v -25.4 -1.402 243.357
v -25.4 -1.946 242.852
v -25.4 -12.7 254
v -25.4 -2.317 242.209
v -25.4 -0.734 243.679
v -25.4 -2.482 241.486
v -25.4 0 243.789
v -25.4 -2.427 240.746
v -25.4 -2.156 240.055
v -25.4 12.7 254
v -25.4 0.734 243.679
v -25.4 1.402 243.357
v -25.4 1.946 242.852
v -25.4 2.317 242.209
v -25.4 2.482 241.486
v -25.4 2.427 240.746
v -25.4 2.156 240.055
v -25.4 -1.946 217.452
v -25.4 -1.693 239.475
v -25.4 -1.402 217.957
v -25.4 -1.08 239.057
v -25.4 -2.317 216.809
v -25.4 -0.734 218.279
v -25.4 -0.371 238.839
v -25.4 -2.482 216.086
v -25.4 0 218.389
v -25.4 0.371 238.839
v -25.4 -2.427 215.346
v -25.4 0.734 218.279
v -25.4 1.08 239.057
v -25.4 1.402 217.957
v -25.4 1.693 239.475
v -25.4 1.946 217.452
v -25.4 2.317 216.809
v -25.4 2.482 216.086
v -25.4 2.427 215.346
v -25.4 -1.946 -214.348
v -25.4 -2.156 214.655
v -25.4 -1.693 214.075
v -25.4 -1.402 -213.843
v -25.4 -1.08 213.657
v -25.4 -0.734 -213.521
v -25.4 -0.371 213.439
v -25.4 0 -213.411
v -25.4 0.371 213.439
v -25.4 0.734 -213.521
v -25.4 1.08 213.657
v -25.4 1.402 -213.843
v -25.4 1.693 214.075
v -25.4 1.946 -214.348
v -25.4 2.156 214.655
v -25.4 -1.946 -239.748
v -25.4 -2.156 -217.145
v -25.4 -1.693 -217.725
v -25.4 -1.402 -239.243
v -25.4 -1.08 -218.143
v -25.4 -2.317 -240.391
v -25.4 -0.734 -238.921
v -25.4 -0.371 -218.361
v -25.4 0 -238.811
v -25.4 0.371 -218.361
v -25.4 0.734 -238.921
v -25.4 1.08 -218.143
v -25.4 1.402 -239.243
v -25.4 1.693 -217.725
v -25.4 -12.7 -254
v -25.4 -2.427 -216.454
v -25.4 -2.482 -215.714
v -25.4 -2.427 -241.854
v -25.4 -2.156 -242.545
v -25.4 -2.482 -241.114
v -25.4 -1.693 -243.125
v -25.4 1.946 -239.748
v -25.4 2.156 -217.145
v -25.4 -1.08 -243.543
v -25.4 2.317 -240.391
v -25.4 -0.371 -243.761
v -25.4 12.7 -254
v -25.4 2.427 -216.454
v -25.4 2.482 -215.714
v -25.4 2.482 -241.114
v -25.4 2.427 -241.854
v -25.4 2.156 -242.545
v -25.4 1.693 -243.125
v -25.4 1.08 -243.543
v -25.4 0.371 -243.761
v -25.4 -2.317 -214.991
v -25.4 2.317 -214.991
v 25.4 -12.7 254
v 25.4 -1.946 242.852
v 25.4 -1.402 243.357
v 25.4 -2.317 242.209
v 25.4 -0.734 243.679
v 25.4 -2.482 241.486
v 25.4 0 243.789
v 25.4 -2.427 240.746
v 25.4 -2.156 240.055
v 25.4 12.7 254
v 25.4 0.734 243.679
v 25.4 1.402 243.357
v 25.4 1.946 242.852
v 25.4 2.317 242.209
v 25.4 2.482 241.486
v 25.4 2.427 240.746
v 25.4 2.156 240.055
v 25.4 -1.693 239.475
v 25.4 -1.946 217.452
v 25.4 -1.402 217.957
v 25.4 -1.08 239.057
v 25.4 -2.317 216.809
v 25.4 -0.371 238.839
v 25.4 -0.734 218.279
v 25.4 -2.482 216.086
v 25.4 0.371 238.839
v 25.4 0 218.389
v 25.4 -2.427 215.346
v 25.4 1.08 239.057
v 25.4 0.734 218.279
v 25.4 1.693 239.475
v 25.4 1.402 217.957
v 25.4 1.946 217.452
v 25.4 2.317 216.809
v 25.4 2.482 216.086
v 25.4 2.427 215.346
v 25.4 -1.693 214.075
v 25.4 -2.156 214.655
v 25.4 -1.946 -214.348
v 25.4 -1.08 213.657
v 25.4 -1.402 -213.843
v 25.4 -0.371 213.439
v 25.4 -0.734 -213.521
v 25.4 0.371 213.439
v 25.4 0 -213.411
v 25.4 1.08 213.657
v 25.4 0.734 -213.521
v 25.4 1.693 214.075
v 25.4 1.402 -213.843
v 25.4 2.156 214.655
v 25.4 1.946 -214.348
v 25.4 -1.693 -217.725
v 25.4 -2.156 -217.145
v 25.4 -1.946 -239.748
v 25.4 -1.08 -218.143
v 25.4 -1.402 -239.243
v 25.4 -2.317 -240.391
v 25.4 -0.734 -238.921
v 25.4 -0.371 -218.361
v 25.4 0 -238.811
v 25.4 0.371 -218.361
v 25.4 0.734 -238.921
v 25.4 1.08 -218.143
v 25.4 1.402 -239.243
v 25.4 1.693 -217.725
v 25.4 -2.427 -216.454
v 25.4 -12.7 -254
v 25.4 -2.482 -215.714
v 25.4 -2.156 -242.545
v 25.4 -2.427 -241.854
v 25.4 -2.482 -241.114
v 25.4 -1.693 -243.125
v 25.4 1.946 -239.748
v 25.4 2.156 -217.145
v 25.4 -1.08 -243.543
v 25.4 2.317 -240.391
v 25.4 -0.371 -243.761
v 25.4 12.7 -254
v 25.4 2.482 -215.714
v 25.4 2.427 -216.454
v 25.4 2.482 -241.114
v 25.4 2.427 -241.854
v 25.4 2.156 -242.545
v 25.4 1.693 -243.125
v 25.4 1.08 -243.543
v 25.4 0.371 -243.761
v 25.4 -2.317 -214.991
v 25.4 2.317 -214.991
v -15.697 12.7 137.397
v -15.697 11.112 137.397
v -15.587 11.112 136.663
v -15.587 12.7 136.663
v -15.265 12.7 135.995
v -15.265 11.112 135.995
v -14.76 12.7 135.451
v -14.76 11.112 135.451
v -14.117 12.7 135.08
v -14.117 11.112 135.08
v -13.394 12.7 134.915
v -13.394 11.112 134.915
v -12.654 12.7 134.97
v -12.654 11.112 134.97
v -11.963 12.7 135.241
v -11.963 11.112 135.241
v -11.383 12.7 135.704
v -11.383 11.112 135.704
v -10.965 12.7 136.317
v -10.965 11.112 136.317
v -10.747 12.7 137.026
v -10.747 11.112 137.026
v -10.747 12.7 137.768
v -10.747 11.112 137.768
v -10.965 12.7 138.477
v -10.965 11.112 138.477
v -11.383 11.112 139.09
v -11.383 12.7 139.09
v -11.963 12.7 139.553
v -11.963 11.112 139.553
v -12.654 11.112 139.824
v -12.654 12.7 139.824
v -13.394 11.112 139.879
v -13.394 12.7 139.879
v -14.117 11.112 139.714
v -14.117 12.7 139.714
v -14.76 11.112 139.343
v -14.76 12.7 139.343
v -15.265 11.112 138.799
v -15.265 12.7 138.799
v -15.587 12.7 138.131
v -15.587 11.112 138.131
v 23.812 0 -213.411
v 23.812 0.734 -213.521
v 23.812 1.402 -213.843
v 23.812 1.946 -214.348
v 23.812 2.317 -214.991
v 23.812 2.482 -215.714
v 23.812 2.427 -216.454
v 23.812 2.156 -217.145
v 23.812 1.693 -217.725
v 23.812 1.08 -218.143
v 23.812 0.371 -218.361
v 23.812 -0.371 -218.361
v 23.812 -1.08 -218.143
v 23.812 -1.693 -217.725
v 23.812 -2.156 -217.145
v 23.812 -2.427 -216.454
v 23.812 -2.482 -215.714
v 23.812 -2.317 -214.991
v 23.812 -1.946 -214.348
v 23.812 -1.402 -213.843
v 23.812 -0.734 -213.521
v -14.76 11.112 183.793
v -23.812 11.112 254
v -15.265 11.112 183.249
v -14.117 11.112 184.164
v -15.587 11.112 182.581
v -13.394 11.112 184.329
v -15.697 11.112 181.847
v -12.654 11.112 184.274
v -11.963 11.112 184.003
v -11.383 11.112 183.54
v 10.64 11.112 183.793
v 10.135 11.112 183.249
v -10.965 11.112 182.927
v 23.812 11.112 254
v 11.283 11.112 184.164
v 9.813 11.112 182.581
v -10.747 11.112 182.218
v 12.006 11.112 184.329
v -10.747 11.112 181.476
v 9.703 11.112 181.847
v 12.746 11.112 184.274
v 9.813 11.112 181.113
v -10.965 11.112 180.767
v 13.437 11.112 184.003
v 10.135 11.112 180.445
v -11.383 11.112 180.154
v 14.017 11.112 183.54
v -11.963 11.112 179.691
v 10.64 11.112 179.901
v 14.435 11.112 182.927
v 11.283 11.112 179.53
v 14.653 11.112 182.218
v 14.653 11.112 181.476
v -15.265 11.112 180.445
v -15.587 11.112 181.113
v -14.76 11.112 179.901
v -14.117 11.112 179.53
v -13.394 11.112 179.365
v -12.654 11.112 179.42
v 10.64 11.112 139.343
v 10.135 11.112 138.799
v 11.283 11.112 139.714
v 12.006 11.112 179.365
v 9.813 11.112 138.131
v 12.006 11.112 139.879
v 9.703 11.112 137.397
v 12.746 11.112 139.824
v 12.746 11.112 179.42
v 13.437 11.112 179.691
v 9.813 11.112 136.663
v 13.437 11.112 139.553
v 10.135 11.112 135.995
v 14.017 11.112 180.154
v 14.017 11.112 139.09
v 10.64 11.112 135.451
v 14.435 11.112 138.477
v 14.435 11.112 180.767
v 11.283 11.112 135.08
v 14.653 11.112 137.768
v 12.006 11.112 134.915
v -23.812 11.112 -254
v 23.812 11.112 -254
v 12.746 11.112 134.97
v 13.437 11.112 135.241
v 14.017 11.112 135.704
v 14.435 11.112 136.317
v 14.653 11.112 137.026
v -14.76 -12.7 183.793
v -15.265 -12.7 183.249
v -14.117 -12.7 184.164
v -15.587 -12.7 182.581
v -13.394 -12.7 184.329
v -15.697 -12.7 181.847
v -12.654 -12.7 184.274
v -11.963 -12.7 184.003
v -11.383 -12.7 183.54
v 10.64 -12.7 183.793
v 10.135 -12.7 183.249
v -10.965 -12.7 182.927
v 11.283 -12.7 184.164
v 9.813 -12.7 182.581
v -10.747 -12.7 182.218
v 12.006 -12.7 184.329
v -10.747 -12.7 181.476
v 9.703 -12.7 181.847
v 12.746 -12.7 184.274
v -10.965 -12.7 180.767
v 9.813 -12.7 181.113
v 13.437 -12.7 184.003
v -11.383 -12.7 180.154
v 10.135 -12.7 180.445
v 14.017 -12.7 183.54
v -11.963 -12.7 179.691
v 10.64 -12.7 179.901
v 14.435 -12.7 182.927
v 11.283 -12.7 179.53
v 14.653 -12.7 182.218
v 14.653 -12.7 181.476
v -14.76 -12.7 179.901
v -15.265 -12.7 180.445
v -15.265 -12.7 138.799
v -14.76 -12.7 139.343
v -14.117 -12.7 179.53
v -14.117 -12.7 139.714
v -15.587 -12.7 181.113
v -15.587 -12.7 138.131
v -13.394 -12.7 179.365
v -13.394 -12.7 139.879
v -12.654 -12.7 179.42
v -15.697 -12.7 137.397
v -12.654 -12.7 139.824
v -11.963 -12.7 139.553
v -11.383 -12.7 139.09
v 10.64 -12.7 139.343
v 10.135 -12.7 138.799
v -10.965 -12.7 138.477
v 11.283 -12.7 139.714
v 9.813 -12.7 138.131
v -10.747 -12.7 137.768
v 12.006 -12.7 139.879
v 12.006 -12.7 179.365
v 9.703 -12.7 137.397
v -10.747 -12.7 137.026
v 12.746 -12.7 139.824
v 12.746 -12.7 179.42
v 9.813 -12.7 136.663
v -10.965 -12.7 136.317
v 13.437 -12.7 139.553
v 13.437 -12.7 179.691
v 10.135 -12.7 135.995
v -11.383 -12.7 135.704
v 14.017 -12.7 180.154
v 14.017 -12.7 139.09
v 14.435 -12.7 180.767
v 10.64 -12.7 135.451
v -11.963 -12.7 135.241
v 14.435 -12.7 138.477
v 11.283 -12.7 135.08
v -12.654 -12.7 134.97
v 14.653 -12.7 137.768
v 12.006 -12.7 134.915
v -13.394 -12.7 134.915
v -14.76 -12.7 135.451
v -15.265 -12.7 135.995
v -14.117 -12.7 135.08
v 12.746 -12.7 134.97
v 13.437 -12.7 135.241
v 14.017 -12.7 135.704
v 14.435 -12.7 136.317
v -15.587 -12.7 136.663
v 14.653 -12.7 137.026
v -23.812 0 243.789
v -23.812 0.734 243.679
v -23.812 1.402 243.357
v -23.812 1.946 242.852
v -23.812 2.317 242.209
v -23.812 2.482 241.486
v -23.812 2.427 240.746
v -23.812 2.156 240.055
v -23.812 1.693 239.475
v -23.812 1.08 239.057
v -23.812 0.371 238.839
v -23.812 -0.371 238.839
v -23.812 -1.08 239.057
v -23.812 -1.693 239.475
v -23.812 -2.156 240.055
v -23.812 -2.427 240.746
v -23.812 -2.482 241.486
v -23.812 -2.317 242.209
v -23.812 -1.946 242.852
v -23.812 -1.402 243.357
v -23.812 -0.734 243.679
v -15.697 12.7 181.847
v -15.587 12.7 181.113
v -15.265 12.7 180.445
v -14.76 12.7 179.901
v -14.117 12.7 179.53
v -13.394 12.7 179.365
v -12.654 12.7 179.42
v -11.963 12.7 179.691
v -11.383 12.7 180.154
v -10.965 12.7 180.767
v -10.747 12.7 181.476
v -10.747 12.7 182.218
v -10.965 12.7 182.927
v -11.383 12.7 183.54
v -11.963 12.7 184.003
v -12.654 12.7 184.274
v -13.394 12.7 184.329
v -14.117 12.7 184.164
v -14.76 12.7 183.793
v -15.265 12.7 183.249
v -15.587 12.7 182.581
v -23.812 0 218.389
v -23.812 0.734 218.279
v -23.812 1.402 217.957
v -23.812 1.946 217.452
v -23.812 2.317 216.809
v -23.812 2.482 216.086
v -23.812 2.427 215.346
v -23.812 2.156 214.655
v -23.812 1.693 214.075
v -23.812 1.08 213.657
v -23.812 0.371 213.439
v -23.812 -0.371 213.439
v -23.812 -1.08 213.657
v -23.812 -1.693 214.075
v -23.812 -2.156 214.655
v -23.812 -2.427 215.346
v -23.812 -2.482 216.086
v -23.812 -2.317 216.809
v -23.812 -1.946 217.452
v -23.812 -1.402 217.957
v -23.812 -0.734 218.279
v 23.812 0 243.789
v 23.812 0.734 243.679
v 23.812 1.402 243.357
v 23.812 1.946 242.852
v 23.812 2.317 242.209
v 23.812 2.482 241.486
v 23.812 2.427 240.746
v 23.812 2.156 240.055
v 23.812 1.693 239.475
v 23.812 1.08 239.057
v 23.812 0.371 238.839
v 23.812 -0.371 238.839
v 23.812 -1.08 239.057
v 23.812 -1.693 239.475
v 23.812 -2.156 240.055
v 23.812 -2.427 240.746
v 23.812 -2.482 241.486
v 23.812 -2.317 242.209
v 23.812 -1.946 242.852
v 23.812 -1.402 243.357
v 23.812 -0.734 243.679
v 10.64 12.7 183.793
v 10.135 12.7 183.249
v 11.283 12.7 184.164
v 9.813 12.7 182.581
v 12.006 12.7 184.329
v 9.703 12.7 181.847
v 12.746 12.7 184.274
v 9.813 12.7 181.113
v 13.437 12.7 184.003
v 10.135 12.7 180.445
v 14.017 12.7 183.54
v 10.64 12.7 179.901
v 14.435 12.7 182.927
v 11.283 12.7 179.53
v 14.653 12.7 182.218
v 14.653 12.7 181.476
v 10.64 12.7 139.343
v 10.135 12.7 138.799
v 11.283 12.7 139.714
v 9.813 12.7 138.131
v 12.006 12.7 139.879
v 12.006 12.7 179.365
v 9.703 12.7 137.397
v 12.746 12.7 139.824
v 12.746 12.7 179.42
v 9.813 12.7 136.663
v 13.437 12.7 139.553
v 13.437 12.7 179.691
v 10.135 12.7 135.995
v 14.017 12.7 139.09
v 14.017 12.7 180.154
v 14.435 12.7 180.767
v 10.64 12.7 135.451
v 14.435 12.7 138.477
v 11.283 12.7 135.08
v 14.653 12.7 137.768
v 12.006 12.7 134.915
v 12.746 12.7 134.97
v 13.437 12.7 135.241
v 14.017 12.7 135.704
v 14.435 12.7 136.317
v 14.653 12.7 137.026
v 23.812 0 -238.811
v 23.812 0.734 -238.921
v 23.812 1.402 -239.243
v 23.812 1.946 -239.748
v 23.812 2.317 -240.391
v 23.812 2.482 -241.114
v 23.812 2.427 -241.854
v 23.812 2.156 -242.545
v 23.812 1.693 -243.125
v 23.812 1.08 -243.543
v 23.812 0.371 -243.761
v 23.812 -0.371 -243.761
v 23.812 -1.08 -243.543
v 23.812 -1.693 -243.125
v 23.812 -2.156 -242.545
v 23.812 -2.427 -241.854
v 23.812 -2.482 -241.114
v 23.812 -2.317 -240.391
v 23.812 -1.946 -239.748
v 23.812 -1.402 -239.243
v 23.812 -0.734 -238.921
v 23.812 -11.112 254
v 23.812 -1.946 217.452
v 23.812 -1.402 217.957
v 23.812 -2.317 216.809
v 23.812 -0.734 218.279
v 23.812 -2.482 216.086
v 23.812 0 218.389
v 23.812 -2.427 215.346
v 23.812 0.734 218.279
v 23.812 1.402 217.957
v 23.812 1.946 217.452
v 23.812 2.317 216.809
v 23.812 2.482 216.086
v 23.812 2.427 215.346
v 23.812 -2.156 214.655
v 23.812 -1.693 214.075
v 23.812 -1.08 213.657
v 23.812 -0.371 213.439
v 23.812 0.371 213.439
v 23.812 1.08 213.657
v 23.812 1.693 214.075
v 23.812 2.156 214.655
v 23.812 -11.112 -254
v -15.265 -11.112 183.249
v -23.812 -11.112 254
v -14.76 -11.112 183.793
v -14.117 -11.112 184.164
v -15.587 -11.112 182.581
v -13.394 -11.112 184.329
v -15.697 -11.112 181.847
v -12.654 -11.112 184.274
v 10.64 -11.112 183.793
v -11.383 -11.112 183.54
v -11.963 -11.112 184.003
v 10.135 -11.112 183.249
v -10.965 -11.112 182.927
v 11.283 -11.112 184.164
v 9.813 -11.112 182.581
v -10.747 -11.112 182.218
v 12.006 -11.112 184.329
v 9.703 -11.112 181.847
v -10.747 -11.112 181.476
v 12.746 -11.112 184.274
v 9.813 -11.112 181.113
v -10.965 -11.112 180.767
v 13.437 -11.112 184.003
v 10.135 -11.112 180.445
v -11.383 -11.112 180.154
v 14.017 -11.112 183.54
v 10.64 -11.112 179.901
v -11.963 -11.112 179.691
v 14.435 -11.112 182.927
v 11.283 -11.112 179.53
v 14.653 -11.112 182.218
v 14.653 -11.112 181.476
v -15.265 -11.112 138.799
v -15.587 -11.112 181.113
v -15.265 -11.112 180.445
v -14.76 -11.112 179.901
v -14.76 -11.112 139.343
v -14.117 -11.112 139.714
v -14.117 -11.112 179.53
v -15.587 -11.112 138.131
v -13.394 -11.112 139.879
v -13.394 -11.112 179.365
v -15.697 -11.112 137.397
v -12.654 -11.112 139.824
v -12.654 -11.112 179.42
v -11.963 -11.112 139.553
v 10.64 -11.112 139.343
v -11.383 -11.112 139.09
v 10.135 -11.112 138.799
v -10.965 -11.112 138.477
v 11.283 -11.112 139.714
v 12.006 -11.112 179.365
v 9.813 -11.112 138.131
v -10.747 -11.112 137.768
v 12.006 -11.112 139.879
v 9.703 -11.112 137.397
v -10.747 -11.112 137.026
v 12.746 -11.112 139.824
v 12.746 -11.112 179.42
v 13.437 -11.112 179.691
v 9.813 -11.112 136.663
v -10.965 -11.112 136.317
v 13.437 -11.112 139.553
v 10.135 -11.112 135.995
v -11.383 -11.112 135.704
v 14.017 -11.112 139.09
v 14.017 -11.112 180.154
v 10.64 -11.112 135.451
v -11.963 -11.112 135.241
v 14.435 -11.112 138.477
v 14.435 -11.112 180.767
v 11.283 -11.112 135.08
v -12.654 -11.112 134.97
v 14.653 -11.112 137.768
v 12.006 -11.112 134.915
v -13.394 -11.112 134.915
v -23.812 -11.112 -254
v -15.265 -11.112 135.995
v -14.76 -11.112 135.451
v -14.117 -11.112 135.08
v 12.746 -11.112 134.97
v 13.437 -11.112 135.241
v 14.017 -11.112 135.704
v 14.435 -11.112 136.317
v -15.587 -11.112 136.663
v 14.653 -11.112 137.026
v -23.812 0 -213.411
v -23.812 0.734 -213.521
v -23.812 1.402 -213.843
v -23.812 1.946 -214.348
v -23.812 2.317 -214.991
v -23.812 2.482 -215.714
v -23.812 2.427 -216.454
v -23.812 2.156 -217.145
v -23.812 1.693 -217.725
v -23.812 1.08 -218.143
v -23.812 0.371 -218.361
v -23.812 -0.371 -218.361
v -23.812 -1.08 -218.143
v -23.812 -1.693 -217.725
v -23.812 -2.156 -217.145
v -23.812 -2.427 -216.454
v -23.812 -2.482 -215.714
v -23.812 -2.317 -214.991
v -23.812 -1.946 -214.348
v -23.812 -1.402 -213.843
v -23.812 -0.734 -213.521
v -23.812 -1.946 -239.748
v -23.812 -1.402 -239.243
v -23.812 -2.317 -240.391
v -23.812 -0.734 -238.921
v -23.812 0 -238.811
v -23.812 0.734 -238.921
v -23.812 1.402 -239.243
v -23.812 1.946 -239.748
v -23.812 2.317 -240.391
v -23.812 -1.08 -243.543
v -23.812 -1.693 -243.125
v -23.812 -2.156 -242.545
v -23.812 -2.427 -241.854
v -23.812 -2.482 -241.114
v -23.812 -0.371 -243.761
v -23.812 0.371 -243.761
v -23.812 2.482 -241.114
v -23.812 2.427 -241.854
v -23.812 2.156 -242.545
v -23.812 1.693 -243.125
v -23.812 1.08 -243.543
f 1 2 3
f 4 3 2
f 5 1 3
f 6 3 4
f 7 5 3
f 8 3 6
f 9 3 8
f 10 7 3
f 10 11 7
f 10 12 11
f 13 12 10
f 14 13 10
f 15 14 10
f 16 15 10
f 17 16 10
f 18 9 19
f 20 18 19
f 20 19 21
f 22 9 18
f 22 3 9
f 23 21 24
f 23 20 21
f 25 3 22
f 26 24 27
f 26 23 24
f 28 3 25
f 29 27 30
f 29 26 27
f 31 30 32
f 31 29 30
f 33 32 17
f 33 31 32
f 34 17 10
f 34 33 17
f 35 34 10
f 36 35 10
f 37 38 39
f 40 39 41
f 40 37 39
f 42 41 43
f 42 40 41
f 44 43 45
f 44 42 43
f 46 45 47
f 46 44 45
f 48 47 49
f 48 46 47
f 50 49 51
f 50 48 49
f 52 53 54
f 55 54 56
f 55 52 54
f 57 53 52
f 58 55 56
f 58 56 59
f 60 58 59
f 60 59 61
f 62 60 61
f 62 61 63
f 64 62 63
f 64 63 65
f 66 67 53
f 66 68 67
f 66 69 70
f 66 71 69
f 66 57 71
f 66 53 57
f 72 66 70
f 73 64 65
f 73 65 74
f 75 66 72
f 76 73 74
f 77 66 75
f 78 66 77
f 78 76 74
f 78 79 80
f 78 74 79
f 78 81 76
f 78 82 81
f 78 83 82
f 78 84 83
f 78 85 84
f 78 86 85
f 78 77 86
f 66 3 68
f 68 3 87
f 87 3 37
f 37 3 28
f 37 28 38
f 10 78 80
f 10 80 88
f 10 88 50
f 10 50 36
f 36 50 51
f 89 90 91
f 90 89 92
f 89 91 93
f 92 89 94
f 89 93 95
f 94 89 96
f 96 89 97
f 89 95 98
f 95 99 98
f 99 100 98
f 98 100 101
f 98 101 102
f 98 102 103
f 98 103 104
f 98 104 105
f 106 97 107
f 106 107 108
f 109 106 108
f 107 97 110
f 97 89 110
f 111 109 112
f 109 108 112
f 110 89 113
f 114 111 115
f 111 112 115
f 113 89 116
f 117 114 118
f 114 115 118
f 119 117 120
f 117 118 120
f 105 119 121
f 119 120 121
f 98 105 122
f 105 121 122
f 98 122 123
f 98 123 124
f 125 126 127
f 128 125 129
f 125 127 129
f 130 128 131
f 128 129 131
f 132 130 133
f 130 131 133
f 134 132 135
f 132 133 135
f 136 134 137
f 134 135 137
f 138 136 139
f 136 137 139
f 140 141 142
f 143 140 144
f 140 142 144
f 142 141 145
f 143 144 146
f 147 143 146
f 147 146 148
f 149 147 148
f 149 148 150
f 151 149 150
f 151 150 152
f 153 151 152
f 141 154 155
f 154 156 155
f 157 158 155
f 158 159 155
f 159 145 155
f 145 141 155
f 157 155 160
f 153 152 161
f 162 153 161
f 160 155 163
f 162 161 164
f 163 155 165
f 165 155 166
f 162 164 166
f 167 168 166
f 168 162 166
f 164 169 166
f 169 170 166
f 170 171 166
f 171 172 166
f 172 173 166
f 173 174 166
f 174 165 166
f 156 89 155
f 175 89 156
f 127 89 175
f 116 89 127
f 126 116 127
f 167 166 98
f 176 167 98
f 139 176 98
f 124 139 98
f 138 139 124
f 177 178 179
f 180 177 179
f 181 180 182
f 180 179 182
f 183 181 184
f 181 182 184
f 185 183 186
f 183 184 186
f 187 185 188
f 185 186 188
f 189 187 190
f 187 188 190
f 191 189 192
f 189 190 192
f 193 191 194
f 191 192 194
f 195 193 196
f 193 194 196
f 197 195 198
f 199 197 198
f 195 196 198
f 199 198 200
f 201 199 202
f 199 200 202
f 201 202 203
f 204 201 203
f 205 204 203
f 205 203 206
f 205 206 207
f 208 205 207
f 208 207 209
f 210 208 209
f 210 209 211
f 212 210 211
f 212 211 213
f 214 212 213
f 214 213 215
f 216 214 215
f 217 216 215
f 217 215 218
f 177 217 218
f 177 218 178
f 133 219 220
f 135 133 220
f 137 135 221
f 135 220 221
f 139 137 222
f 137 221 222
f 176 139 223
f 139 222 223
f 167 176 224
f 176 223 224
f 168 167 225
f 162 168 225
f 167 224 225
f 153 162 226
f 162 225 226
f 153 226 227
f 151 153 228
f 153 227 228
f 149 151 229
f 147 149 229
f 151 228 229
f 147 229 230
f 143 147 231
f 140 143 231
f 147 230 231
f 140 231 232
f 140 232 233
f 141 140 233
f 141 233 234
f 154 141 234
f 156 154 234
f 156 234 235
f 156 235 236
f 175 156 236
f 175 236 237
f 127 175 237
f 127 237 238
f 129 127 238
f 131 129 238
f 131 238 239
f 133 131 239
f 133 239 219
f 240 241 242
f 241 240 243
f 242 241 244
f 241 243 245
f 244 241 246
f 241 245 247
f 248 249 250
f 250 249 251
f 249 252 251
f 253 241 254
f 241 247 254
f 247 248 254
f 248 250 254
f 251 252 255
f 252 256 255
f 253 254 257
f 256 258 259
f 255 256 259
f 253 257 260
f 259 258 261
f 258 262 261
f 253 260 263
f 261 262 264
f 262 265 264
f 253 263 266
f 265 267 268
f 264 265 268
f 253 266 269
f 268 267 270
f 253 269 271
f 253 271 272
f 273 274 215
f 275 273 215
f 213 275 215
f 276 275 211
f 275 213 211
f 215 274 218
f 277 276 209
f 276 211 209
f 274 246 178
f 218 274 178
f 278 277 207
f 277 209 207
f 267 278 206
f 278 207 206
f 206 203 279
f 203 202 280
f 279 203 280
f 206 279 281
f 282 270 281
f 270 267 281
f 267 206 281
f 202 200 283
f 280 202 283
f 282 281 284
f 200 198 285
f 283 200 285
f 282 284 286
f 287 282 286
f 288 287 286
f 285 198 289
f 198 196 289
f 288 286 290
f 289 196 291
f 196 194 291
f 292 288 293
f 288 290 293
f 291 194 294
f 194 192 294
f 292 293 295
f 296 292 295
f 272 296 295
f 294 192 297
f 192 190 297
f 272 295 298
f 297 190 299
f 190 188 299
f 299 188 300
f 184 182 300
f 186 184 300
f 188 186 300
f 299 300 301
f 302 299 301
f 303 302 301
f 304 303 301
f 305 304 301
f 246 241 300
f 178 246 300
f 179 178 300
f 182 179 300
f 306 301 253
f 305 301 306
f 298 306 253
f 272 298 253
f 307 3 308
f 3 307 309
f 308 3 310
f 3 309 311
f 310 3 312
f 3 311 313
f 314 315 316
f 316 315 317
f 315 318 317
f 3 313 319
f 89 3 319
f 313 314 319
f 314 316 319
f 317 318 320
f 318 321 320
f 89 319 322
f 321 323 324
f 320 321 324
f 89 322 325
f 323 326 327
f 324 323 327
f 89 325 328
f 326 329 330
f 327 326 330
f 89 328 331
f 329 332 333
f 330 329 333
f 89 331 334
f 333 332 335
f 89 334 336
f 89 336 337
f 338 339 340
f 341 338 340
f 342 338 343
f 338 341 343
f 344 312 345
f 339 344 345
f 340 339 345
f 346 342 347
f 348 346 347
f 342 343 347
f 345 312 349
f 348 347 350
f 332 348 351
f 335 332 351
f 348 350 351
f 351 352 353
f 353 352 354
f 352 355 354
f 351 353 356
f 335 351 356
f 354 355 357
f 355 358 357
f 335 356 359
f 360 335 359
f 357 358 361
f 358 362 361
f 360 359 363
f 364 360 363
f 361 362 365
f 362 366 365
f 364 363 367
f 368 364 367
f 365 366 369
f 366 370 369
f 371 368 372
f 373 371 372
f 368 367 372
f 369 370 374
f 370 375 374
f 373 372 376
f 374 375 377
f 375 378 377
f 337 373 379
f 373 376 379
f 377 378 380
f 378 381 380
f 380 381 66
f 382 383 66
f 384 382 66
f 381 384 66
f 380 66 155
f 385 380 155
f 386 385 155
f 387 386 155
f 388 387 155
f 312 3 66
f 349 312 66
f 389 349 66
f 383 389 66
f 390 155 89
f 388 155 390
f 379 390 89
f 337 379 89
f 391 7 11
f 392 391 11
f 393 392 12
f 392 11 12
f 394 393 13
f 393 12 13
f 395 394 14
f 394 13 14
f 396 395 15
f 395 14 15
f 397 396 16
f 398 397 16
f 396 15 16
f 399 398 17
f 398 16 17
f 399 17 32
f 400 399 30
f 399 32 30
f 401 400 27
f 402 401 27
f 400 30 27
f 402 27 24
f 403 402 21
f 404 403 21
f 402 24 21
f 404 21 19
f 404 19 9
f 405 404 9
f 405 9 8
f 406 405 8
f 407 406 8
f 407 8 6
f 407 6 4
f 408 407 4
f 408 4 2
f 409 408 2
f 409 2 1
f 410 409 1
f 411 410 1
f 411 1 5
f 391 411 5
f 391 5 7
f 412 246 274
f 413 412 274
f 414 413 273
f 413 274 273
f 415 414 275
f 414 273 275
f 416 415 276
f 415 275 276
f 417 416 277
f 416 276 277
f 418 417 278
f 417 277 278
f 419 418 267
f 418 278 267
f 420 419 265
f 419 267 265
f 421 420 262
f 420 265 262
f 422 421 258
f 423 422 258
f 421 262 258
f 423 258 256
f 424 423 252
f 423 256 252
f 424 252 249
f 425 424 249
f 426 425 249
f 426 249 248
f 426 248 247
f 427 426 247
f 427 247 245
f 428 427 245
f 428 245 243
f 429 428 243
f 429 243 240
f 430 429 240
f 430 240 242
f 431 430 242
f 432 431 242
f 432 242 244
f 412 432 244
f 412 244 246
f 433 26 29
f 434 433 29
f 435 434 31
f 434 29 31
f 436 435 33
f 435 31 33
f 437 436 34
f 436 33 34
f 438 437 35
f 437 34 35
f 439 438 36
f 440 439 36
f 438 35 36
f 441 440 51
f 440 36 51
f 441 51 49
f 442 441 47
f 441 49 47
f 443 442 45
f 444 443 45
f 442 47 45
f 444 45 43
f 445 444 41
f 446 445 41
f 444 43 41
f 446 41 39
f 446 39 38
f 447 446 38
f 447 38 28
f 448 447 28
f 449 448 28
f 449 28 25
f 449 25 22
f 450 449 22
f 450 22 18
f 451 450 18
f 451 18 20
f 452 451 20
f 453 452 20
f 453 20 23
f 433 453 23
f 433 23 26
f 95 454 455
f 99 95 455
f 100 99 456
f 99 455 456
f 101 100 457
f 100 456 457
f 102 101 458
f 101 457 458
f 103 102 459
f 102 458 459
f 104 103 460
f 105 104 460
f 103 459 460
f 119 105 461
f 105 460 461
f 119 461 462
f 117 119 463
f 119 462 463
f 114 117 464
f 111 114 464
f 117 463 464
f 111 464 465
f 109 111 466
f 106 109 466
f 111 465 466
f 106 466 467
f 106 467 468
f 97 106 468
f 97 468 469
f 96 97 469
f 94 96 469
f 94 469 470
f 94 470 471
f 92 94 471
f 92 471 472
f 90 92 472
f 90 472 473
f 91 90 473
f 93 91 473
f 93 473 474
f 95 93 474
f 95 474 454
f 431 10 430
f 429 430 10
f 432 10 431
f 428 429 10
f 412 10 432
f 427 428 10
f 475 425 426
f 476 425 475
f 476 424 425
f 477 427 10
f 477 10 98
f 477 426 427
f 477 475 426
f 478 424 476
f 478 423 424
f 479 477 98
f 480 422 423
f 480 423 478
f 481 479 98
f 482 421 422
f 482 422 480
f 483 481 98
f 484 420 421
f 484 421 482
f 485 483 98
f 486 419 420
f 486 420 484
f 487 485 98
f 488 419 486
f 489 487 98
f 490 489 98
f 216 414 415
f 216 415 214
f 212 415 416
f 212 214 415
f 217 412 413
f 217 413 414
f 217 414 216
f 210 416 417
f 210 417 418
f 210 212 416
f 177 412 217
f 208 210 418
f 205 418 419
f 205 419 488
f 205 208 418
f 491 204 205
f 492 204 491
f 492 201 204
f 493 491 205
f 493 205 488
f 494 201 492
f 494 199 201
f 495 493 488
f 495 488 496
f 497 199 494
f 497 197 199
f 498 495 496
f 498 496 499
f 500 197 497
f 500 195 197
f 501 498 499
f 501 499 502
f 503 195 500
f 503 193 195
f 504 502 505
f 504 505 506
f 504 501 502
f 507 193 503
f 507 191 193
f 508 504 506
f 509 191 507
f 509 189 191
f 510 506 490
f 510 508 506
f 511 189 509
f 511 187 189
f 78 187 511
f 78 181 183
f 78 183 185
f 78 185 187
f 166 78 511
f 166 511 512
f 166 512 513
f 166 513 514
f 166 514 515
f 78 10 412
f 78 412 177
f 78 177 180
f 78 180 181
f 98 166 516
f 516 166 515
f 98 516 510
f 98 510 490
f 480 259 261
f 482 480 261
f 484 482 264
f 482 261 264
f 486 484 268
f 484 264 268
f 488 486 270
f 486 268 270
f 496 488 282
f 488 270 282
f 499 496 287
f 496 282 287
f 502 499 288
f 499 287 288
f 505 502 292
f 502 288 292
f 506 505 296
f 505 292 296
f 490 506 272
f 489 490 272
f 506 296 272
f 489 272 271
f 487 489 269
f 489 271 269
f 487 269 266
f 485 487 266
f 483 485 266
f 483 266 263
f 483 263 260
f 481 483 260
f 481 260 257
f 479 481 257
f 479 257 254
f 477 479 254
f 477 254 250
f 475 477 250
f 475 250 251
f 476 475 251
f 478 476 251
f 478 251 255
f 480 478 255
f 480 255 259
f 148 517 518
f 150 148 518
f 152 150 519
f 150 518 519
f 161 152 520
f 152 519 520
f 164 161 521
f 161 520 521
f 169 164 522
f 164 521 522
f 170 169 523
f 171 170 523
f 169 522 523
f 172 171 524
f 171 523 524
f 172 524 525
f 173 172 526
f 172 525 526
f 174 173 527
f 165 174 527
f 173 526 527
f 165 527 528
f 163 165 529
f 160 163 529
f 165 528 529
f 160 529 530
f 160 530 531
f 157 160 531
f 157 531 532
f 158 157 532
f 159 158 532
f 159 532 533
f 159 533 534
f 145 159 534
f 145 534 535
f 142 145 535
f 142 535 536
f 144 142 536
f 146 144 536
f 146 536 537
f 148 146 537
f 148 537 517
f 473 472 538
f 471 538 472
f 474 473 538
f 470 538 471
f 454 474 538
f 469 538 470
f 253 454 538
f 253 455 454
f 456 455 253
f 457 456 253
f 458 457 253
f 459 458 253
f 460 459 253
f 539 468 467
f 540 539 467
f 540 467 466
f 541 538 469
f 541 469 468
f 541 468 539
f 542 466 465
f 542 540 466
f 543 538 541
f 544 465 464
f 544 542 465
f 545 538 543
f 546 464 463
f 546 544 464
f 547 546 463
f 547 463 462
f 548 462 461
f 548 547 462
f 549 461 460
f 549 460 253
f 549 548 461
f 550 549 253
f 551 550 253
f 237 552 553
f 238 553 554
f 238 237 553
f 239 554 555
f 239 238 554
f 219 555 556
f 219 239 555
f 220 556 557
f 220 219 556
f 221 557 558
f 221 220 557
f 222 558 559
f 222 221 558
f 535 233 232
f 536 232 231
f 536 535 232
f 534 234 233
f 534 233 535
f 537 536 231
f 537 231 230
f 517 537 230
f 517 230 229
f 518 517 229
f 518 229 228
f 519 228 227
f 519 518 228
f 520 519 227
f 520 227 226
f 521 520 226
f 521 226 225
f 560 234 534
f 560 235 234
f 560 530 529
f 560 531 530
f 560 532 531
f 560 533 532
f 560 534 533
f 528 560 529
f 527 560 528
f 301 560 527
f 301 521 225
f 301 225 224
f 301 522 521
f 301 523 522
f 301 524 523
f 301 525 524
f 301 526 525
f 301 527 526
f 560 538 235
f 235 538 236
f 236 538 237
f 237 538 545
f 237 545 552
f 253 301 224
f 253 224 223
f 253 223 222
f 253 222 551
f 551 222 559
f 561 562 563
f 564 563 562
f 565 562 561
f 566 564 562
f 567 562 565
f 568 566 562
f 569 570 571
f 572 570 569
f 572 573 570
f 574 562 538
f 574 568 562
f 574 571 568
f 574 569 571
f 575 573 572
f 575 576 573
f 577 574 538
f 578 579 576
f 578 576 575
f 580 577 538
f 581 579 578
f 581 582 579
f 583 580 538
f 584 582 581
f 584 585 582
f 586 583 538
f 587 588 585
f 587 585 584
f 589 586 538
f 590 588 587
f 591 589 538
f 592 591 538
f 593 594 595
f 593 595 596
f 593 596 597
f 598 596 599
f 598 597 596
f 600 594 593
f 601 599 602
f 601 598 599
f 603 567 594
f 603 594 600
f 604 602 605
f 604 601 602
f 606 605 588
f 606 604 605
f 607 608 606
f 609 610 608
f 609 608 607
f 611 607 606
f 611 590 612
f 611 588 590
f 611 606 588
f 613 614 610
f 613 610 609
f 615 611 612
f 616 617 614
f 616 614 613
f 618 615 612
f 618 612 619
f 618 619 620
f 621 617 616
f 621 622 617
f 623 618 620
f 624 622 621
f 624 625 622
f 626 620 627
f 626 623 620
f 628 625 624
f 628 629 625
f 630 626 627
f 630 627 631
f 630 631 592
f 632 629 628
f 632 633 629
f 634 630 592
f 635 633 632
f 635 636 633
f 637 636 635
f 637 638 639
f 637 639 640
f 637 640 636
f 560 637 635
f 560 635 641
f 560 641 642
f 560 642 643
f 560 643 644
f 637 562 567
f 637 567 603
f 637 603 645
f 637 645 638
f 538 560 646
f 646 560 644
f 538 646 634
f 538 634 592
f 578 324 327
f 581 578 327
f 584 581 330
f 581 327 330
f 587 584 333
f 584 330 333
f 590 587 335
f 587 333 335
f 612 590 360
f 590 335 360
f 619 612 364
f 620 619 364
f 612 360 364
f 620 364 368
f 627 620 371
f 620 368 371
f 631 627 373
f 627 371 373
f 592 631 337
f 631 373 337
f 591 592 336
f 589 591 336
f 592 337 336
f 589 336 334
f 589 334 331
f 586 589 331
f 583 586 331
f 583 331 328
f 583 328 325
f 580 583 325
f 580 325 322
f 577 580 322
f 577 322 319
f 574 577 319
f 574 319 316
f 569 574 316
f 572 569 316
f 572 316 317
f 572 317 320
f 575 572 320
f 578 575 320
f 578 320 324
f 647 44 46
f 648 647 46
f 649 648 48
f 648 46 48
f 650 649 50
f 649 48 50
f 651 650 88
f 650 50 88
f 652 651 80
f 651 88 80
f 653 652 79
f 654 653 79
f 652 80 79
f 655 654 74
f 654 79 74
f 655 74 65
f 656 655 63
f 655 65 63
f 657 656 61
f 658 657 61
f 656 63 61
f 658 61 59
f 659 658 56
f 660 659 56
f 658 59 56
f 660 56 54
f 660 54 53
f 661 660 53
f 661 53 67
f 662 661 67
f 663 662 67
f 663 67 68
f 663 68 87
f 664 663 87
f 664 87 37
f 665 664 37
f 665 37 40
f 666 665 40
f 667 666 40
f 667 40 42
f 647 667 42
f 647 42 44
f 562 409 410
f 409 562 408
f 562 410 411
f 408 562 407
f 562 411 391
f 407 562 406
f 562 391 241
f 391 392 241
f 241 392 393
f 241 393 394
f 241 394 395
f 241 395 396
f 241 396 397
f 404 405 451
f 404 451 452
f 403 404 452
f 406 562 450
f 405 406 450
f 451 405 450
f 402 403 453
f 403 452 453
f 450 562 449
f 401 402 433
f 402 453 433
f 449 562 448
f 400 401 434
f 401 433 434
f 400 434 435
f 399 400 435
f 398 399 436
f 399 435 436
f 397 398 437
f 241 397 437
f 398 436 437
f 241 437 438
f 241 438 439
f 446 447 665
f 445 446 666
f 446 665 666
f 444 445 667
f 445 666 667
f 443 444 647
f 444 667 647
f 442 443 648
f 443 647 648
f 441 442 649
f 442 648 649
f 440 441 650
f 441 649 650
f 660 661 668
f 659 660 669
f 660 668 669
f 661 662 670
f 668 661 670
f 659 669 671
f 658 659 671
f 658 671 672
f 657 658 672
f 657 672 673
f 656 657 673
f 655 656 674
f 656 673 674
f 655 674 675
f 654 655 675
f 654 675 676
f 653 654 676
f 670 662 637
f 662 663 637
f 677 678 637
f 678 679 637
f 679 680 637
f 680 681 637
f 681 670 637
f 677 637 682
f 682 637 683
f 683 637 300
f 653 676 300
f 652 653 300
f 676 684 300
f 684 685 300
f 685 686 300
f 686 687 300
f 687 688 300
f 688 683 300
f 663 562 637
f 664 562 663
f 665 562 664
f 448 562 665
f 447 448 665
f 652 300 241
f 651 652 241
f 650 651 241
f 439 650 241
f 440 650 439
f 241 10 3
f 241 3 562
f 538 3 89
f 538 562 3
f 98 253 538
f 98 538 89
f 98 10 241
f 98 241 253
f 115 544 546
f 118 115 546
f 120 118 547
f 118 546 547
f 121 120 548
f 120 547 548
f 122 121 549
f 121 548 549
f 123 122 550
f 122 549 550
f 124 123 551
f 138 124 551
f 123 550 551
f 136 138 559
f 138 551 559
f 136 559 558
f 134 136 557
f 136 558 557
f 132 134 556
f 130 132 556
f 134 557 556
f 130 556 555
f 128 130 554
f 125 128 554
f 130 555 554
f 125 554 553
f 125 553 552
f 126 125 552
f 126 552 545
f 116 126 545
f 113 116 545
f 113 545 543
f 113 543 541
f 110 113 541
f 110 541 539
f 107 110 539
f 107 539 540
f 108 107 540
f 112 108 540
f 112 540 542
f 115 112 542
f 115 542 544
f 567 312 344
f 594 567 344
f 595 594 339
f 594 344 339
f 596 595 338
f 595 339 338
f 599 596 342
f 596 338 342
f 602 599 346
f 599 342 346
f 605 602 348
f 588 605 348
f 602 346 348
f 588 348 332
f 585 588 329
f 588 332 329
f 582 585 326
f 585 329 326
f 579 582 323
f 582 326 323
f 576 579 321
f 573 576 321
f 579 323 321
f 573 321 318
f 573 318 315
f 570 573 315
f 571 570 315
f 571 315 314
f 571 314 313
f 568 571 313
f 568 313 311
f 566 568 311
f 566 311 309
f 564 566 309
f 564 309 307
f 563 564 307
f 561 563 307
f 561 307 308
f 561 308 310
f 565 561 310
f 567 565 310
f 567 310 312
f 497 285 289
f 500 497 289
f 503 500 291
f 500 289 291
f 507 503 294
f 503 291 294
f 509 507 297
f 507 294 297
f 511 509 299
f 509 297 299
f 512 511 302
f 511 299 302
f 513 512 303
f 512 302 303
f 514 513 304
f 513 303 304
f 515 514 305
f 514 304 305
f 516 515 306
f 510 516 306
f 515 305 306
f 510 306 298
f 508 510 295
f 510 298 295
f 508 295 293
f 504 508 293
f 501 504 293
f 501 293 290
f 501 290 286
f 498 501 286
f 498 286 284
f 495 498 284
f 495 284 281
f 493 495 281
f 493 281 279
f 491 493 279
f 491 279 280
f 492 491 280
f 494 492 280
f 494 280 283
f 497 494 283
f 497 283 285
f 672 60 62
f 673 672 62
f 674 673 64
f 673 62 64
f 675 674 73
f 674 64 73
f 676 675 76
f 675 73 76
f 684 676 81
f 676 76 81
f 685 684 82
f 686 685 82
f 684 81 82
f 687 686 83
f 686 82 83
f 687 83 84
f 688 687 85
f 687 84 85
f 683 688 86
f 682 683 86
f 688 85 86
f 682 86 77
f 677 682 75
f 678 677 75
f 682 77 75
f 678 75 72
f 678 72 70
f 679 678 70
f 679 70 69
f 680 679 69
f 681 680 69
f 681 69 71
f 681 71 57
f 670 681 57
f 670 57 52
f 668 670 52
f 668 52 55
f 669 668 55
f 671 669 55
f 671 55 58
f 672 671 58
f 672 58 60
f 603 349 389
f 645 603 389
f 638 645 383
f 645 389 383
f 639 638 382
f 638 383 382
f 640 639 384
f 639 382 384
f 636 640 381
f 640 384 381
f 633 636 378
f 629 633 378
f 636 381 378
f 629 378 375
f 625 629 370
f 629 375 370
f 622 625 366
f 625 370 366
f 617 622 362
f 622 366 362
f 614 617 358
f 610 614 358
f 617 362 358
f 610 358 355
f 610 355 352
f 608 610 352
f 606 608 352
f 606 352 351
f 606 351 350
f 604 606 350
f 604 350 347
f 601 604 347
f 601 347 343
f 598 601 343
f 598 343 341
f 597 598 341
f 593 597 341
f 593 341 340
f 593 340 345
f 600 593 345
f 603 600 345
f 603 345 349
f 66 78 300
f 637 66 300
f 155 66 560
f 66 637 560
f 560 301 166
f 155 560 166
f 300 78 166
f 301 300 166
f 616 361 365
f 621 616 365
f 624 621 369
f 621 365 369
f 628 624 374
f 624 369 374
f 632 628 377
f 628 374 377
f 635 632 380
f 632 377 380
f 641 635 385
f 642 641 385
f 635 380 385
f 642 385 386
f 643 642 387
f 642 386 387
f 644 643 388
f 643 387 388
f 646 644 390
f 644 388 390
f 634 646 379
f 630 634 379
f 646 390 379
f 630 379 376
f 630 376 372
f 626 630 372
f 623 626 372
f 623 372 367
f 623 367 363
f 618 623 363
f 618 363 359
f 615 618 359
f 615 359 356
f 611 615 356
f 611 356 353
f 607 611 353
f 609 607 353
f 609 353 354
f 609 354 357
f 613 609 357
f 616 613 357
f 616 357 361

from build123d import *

# Parameters (mm, degrees)
BOSS_EXTRUDE1_DEPTH      = 254.000001
BOSS_EXTRUDE1_DEPTH_BACK = 254.000001
SKETCH3_W                = 50.8
SKETCH3_H                = 25.4
SKETCH3_W_2              = 47.625
SKETCH3_H_2              = 22.225
F_10_CLEARANCE_HOLE1_D   = 4.9784
F_10_CLEARANCE_HOLE2_D   = 4.9784


with BuildPart() as part:
    # Sketch3 → Boss-Extrude1 (new, two sides: drawn at the far end of the back side and taken through both)
    with BuildSketch(Plane.XY.offset(-BOSS_EXTRUDE1_DEPTH_BACK)):
        Rectangle(SKETCH3_W, SKETCH3_H)
        Rectangle(SKETCH3_W_2, SKETCH3_H_2, mode=Mode.SUBTRACT)
    extrude(amount=BOSS_EXTRUDE1_DEPTH + BOSS_EXTRUDE1_DEPTH_BACK)

    # #10 Clearance Hole1 (through all)
    with Locations(Plane(origin=(25.4, 0, 0), x_dir=(0, 0, -1), z_dir=(1, 0, 0))):
        with Locations((-241.300000508, 0), (-215.900000508, 0), (215.899999492, 0), (241.299999492, 0)):
            Hole(F_10_CLEARANCE_HOLE1_D / 2)

    # #10 Clearance Hole2 (through all)
    with Locations(Plane(origin=(0, 12.7, 0), x_dir=(1, 0, 0), z_dir=(0, 1, 0))):
        with Locations((12.19200009, -137.396900508), (-13.20799991, -137.396900508), (-13.20799991, -181.846900508), (12.19200009, -181.846900508)):
            Hole(F_10_CLEARANCE_HOLE2_D / 2)


solid = part.part
